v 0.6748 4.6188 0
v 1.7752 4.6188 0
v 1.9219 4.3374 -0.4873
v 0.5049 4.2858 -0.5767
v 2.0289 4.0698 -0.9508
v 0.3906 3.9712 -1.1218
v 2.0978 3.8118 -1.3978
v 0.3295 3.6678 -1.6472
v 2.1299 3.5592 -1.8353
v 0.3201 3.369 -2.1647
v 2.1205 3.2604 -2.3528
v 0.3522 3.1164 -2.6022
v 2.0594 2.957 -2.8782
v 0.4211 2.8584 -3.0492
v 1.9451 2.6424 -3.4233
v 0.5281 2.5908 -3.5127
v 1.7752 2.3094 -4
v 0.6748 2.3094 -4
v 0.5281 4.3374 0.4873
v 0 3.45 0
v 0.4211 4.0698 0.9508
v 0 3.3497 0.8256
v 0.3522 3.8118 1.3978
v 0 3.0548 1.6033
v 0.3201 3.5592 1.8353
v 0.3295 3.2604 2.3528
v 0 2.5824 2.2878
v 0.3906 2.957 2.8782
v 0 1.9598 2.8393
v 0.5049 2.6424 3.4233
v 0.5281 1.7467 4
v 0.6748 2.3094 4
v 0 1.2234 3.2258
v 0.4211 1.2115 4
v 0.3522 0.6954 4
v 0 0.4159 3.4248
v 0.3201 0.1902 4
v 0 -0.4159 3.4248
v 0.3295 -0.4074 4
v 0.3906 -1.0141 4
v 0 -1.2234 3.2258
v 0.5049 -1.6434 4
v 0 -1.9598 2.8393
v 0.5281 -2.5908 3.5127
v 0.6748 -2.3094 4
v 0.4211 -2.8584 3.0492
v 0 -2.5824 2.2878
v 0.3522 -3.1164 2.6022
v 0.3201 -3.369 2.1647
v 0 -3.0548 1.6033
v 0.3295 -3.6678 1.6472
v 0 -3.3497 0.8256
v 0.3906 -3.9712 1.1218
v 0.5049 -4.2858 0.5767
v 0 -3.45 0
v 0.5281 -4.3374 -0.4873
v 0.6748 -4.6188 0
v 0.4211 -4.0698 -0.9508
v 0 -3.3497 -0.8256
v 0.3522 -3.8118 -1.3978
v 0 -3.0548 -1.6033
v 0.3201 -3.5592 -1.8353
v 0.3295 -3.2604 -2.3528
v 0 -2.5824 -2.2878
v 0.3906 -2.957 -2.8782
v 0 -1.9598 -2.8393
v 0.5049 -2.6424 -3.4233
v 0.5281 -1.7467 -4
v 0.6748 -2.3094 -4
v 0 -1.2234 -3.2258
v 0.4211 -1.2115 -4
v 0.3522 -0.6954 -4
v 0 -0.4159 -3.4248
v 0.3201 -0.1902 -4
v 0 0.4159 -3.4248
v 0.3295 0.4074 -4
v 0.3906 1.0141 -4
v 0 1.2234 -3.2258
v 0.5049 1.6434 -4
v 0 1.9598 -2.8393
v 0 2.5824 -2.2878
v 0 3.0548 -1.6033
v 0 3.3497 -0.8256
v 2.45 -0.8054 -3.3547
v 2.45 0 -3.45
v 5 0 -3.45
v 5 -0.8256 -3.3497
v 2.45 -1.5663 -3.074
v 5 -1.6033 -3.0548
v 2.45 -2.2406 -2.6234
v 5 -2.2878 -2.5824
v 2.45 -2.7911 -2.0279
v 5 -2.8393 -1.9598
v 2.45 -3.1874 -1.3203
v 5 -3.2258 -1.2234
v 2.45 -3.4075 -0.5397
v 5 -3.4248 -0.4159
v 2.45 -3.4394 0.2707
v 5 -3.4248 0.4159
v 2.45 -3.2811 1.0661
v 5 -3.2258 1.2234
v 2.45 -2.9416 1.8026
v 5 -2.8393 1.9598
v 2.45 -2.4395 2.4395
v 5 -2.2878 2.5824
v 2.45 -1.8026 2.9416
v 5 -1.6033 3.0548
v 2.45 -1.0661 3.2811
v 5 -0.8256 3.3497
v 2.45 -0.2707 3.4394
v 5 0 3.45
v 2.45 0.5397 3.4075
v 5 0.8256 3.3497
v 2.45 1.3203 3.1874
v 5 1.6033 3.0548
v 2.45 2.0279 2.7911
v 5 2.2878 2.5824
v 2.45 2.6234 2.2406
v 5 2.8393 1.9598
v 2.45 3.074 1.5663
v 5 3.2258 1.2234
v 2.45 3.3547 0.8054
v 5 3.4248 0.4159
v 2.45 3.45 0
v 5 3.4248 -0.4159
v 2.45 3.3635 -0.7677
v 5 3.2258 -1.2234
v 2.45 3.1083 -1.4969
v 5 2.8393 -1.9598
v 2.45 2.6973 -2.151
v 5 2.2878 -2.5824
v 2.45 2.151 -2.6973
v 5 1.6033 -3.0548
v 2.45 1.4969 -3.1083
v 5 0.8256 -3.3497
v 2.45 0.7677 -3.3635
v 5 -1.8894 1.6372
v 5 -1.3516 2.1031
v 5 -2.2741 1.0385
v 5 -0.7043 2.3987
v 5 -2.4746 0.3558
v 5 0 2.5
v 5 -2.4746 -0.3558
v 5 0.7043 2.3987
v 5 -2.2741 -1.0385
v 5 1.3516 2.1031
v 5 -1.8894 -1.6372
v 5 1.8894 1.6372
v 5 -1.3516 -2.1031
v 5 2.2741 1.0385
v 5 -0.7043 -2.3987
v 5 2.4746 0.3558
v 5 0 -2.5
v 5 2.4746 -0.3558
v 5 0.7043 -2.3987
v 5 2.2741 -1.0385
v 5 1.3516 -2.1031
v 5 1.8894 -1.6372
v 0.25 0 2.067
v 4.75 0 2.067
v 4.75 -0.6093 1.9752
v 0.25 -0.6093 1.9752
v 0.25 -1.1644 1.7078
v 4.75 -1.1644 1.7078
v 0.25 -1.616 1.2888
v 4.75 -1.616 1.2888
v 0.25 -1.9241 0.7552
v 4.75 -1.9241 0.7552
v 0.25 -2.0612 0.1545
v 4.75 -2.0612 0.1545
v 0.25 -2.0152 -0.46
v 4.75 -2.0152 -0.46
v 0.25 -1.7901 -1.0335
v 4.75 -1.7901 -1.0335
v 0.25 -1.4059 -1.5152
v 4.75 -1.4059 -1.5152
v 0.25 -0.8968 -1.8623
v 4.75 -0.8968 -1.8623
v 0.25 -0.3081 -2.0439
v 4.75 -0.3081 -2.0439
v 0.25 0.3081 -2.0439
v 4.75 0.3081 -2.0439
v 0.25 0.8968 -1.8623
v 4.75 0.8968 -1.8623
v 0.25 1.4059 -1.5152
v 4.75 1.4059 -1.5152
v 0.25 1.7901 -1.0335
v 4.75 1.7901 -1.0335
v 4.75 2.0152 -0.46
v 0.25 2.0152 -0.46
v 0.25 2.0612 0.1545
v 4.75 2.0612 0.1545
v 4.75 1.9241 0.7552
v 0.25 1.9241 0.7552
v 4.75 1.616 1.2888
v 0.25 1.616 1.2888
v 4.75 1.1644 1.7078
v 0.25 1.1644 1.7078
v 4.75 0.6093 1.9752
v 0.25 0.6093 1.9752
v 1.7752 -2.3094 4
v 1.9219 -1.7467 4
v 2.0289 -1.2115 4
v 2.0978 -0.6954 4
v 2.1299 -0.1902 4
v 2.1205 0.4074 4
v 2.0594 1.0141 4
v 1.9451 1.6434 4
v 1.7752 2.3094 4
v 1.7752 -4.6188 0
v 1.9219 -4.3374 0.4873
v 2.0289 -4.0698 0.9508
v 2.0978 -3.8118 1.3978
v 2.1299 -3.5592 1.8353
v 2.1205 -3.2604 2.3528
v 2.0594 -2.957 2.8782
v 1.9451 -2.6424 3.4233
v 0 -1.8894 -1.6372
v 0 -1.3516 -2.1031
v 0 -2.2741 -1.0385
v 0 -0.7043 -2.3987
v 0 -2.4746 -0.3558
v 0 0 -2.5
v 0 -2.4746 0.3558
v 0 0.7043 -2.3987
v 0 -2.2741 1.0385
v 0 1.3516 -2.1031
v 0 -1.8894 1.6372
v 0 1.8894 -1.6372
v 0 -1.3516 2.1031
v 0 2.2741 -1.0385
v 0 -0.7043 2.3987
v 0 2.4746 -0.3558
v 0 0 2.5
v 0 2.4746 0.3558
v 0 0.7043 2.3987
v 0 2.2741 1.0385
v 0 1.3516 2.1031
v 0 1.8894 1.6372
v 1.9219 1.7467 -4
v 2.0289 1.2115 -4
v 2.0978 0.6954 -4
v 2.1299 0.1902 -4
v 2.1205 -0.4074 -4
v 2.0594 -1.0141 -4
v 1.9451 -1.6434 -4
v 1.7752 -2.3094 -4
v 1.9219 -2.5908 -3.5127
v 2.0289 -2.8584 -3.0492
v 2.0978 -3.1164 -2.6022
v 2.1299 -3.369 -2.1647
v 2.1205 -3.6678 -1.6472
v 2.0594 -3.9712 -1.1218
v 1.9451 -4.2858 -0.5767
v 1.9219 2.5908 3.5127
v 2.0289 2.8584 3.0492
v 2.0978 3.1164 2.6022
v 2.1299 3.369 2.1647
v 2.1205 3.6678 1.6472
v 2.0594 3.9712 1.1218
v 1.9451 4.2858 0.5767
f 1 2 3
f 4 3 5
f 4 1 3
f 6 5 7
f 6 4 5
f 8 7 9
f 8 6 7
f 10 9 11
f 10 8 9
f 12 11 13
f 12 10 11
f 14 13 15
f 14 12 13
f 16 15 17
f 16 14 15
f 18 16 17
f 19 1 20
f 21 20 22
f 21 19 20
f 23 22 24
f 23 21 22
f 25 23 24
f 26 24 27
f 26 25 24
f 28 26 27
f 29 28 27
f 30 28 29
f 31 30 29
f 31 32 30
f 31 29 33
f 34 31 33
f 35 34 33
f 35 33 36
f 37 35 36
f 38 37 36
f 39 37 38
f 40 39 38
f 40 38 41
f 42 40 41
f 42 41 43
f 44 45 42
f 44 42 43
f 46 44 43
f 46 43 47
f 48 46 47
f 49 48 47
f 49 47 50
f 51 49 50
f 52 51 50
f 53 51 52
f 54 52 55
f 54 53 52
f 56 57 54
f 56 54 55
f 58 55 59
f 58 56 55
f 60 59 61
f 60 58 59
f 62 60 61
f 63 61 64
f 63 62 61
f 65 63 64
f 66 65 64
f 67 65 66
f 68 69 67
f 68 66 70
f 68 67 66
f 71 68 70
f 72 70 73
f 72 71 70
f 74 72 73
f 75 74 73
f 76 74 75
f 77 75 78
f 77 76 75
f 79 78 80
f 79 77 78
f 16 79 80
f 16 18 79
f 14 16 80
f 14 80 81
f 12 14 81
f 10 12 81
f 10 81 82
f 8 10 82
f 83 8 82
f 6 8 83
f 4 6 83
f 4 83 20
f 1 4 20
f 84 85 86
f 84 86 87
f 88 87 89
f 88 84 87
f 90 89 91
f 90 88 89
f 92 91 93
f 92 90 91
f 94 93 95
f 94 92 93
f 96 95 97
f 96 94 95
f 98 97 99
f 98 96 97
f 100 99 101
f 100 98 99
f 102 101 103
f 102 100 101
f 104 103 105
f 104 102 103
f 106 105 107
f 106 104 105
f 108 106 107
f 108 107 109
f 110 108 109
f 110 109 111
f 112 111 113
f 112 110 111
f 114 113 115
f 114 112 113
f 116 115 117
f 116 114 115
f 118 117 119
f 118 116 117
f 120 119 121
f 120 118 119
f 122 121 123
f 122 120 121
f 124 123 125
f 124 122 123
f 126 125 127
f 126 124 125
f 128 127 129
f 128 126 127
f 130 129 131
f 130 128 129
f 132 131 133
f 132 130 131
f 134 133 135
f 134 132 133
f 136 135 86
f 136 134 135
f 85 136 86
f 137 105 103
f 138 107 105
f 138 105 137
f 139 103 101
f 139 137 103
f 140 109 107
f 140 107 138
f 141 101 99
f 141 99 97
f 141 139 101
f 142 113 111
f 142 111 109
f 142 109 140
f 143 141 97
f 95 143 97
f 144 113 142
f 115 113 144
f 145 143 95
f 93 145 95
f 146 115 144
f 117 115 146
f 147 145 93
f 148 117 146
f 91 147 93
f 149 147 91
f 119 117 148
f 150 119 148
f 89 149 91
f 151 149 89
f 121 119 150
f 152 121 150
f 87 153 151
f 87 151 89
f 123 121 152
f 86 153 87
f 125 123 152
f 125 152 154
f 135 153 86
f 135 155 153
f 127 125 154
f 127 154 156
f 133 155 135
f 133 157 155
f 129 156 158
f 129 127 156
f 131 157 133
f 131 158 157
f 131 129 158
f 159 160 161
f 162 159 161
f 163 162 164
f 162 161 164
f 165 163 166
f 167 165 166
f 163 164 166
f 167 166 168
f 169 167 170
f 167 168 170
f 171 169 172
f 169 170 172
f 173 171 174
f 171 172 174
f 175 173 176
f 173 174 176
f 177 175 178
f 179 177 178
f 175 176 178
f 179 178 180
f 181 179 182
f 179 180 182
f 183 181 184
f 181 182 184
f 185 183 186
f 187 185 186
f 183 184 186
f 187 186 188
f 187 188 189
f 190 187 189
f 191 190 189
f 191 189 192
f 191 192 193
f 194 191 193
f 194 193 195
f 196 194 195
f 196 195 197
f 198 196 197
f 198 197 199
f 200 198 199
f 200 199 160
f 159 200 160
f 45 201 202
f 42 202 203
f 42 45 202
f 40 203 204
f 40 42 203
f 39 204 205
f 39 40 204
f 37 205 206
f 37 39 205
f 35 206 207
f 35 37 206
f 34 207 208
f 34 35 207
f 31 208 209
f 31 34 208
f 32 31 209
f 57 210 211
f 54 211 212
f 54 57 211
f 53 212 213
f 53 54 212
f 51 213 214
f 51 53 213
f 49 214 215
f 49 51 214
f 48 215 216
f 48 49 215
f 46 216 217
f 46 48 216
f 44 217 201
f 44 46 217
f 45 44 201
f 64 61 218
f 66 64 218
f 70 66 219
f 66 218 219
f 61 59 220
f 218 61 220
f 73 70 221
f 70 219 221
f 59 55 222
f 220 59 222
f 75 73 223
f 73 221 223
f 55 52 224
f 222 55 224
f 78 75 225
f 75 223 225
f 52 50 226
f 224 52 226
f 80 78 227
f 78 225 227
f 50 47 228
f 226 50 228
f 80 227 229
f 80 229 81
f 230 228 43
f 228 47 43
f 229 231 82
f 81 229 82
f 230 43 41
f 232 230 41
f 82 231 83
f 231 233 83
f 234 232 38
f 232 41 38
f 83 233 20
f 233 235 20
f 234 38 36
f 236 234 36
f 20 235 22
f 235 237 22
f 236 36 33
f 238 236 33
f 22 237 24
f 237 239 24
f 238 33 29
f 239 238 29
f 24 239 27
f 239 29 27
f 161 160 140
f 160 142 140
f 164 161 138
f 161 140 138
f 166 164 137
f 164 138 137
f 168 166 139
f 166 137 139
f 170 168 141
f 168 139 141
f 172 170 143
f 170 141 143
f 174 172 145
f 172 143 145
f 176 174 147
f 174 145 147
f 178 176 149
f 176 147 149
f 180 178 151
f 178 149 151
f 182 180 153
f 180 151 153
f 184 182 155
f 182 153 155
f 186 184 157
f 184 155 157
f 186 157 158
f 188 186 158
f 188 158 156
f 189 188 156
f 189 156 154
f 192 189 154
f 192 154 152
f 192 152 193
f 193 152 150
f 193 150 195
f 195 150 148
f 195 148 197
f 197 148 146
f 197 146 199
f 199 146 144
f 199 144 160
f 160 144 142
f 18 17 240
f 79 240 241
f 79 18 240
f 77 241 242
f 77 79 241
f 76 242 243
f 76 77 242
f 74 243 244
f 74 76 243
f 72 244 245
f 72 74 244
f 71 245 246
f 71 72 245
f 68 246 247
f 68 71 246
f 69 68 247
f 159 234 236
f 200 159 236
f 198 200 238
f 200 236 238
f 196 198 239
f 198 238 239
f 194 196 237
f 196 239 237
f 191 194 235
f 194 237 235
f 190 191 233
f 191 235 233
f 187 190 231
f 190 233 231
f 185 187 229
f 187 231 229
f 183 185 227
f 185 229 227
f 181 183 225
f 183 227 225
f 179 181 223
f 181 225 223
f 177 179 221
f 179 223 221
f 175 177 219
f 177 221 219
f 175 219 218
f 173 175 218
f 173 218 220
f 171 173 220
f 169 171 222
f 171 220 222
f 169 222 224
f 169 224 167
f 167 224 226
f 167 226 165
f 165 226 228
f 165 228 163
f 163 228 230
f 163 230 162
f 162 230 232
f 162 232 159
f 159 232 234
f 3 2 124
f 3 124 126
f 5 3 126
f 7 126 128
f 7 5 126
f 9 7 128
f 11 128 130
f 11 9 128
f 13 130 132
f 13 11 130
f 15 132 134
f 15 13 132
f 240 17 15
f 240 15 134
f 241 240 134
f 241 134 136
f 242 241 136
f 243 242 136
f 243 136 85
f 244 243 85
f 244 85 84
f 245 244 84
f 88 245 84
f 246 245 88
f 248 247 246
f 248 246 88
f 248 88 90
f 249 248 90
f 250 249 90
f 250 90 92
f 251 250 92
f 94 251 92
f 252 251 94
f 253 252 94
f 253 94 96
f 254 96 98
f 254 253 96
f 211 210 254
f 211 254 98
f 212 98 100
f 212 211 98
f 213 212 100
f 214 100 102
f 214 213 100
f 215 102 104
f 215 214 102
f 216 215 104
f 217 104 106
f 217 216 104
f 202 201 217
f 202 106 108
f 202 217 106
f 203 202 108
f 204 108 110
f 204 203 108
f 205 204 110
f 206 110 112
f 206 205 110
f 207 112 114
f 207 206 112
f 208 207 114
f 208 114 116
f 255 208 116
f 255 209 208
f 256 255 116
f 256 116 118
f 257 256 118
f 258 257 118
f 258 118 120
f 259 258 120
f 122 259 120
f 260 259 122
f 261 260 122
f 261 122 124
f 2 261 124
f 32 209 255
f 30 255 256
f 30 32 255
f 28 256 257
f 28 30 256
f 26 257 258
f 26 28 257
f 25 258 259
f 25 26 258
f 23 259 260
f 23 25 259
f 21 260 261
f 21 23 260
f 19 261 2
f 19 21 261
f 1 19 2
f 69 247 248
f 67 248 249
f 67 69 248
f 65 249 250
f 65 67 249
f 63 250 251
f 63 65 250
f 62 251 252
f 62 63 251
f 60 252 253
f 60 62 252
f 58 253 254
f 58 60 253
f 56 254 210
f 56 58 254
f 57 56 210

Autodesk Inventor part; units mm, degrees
ref_plane "YZ Plane" through (0, 0, 0) normal (1, 0, 0) x (0, 1, 0)
ref_plane "XZ Plane" through (0, 0, 0) normal (0, 1, 0) x (-1, 0, 0)
sketch "Skizze1" plane through (0, 0, 0) normal (1, 0, 0) x (0, 1, 0)
  line L0 (2.3094, -4) -> (-2.3094, -4)
  line L1 (-2.3094, -4) -> (-4.6188, 0)
  line L2 (-4.6188, 0) -> (-2.3094, 4)
  line L3 (-2.3094, 4) -> (2.3094, 4)
  line L4 (2.3094, 4) -> (4.6188, 0)
  line L5 (4.6188, 0) -> (2.3094, -4)
  point P0 (0, 0)
  point P1 (0, 0)
  dimension "d0" = 9.2376
extrude "Körper" add sketch "Skizze1" along normal blind 2.45
sketch "Skizze2" plane through (2.45, 0, 0) normal (1, 0, 0) x (0, 0, -1)
  circle A0 centre (0, 0) radius 3.45
  dimension "d7" = 6.9
extrude "Ring" add sketch "Skizze2" along normal blind 2.55
sketch "Skizze3" plane through (0, 0, 0) normal (0, 0, 1) x (1, 0, 0)
  line L0 (0, 2.3094) -> (0, 4.6188) projected
  line L1 (0, 4.6188) -> (2.45, 4.6188) projected
  line L2 (2.45, 2.3094) -> (2.45, 4.6188) projected
  line L3 (-0.49, 0) -> (2.94, 0) projected
  line L4 (0, 3.45) -> (0.6748, 4.6188)
  line L5 (1.7752, 4.6188) -> (2.45, 3.45)
  dimension "d3" = 30
  dimension "d4" = 30
  dimension "d5" = 6.9
  dimension "d6" = 6.9
revolve "Fase1" cut sketch "Skizze3" angle 360 about axis through (-10, 0, 0) along (1, 0, 0)
sketch "Skizze4" plane through (0, 0, 0) normal (-1, 0, 0) x (0, 0, 1)
  line L0 (0, -6.4663) -> (0, 6.4663) projected
  line L1 (-5.6, 0) -> (5.6, 0) projected
  point P0 (0, 0)
hole "Gewinde" at (0, 0, 0) direction (1, 0, 0) diameter 4.134 end through all thread size "M5x0.8" class "6H" standard "ISO Metric profile"
chamfer "Fase2" distance 0.433 angle 30 1 edges at (0, 0, -2.067) measured on face at (0, 2.9506, -0.3583)
chamfer "Fase3" distance 0.433 angle 30 1 edges at (5, 0, -2.067) measured on face at (5, -0.4401, -2.9356)
ref_plane "Work Plane1" through (13.2035, 0, 0) normal (0, 0, 1) x (-1, 0, 0)
equation "\"d0\" = 1.1547 * SW"
equation "\"d1\" = KOH1"
equation "\"d7\" = SD2"
equation "\"d8\" = KOH - KOH1"
equation "\"d3\" = ANG1"
equation "\"d4\" = ANG2"
equation "\"d5\" = SW0"
equation "\"d6\" = SW01"
equation "\"d10\" = -0.5 * GD1 + 0.5 * NND"
equation "\"d46\" = -0.5 * GD1 + 0.5 * NND"
equation "\"d12\" = -0.5 * GD1 + 0.5 * NND"
equation "\"d47\" = -0.5 * GD1 + 0.5 * NND"
equation "\"ANG1\" = 30deg"
equation "\"ANG2\" = 30deg"
equation "\"NND\" = 5"
equation "\"KOH1\" = 2.45"
equation "\"KOH\" = 5"
equation "\"SW\" = 8"
equation "\"SW0\" = 6.9"
equation "\"SW01\" = SW0"
equation "\"SD2\" = SW0"
equation "\"GUL\" = 0.541266 * PTC"
equation "\"THREADDIA\" = 5"
equation "\"TOA\" = 30deg"
equation "\"PTC\" = 0.8"
equation "\"E0\" = 1.155 * SW"
equation "\"GAL\" = 0.541266 * PTC"
equation "\"GD1\" = 4.133975"
properties part number "ISO 10511 - M5" material "Stahl, weich"
